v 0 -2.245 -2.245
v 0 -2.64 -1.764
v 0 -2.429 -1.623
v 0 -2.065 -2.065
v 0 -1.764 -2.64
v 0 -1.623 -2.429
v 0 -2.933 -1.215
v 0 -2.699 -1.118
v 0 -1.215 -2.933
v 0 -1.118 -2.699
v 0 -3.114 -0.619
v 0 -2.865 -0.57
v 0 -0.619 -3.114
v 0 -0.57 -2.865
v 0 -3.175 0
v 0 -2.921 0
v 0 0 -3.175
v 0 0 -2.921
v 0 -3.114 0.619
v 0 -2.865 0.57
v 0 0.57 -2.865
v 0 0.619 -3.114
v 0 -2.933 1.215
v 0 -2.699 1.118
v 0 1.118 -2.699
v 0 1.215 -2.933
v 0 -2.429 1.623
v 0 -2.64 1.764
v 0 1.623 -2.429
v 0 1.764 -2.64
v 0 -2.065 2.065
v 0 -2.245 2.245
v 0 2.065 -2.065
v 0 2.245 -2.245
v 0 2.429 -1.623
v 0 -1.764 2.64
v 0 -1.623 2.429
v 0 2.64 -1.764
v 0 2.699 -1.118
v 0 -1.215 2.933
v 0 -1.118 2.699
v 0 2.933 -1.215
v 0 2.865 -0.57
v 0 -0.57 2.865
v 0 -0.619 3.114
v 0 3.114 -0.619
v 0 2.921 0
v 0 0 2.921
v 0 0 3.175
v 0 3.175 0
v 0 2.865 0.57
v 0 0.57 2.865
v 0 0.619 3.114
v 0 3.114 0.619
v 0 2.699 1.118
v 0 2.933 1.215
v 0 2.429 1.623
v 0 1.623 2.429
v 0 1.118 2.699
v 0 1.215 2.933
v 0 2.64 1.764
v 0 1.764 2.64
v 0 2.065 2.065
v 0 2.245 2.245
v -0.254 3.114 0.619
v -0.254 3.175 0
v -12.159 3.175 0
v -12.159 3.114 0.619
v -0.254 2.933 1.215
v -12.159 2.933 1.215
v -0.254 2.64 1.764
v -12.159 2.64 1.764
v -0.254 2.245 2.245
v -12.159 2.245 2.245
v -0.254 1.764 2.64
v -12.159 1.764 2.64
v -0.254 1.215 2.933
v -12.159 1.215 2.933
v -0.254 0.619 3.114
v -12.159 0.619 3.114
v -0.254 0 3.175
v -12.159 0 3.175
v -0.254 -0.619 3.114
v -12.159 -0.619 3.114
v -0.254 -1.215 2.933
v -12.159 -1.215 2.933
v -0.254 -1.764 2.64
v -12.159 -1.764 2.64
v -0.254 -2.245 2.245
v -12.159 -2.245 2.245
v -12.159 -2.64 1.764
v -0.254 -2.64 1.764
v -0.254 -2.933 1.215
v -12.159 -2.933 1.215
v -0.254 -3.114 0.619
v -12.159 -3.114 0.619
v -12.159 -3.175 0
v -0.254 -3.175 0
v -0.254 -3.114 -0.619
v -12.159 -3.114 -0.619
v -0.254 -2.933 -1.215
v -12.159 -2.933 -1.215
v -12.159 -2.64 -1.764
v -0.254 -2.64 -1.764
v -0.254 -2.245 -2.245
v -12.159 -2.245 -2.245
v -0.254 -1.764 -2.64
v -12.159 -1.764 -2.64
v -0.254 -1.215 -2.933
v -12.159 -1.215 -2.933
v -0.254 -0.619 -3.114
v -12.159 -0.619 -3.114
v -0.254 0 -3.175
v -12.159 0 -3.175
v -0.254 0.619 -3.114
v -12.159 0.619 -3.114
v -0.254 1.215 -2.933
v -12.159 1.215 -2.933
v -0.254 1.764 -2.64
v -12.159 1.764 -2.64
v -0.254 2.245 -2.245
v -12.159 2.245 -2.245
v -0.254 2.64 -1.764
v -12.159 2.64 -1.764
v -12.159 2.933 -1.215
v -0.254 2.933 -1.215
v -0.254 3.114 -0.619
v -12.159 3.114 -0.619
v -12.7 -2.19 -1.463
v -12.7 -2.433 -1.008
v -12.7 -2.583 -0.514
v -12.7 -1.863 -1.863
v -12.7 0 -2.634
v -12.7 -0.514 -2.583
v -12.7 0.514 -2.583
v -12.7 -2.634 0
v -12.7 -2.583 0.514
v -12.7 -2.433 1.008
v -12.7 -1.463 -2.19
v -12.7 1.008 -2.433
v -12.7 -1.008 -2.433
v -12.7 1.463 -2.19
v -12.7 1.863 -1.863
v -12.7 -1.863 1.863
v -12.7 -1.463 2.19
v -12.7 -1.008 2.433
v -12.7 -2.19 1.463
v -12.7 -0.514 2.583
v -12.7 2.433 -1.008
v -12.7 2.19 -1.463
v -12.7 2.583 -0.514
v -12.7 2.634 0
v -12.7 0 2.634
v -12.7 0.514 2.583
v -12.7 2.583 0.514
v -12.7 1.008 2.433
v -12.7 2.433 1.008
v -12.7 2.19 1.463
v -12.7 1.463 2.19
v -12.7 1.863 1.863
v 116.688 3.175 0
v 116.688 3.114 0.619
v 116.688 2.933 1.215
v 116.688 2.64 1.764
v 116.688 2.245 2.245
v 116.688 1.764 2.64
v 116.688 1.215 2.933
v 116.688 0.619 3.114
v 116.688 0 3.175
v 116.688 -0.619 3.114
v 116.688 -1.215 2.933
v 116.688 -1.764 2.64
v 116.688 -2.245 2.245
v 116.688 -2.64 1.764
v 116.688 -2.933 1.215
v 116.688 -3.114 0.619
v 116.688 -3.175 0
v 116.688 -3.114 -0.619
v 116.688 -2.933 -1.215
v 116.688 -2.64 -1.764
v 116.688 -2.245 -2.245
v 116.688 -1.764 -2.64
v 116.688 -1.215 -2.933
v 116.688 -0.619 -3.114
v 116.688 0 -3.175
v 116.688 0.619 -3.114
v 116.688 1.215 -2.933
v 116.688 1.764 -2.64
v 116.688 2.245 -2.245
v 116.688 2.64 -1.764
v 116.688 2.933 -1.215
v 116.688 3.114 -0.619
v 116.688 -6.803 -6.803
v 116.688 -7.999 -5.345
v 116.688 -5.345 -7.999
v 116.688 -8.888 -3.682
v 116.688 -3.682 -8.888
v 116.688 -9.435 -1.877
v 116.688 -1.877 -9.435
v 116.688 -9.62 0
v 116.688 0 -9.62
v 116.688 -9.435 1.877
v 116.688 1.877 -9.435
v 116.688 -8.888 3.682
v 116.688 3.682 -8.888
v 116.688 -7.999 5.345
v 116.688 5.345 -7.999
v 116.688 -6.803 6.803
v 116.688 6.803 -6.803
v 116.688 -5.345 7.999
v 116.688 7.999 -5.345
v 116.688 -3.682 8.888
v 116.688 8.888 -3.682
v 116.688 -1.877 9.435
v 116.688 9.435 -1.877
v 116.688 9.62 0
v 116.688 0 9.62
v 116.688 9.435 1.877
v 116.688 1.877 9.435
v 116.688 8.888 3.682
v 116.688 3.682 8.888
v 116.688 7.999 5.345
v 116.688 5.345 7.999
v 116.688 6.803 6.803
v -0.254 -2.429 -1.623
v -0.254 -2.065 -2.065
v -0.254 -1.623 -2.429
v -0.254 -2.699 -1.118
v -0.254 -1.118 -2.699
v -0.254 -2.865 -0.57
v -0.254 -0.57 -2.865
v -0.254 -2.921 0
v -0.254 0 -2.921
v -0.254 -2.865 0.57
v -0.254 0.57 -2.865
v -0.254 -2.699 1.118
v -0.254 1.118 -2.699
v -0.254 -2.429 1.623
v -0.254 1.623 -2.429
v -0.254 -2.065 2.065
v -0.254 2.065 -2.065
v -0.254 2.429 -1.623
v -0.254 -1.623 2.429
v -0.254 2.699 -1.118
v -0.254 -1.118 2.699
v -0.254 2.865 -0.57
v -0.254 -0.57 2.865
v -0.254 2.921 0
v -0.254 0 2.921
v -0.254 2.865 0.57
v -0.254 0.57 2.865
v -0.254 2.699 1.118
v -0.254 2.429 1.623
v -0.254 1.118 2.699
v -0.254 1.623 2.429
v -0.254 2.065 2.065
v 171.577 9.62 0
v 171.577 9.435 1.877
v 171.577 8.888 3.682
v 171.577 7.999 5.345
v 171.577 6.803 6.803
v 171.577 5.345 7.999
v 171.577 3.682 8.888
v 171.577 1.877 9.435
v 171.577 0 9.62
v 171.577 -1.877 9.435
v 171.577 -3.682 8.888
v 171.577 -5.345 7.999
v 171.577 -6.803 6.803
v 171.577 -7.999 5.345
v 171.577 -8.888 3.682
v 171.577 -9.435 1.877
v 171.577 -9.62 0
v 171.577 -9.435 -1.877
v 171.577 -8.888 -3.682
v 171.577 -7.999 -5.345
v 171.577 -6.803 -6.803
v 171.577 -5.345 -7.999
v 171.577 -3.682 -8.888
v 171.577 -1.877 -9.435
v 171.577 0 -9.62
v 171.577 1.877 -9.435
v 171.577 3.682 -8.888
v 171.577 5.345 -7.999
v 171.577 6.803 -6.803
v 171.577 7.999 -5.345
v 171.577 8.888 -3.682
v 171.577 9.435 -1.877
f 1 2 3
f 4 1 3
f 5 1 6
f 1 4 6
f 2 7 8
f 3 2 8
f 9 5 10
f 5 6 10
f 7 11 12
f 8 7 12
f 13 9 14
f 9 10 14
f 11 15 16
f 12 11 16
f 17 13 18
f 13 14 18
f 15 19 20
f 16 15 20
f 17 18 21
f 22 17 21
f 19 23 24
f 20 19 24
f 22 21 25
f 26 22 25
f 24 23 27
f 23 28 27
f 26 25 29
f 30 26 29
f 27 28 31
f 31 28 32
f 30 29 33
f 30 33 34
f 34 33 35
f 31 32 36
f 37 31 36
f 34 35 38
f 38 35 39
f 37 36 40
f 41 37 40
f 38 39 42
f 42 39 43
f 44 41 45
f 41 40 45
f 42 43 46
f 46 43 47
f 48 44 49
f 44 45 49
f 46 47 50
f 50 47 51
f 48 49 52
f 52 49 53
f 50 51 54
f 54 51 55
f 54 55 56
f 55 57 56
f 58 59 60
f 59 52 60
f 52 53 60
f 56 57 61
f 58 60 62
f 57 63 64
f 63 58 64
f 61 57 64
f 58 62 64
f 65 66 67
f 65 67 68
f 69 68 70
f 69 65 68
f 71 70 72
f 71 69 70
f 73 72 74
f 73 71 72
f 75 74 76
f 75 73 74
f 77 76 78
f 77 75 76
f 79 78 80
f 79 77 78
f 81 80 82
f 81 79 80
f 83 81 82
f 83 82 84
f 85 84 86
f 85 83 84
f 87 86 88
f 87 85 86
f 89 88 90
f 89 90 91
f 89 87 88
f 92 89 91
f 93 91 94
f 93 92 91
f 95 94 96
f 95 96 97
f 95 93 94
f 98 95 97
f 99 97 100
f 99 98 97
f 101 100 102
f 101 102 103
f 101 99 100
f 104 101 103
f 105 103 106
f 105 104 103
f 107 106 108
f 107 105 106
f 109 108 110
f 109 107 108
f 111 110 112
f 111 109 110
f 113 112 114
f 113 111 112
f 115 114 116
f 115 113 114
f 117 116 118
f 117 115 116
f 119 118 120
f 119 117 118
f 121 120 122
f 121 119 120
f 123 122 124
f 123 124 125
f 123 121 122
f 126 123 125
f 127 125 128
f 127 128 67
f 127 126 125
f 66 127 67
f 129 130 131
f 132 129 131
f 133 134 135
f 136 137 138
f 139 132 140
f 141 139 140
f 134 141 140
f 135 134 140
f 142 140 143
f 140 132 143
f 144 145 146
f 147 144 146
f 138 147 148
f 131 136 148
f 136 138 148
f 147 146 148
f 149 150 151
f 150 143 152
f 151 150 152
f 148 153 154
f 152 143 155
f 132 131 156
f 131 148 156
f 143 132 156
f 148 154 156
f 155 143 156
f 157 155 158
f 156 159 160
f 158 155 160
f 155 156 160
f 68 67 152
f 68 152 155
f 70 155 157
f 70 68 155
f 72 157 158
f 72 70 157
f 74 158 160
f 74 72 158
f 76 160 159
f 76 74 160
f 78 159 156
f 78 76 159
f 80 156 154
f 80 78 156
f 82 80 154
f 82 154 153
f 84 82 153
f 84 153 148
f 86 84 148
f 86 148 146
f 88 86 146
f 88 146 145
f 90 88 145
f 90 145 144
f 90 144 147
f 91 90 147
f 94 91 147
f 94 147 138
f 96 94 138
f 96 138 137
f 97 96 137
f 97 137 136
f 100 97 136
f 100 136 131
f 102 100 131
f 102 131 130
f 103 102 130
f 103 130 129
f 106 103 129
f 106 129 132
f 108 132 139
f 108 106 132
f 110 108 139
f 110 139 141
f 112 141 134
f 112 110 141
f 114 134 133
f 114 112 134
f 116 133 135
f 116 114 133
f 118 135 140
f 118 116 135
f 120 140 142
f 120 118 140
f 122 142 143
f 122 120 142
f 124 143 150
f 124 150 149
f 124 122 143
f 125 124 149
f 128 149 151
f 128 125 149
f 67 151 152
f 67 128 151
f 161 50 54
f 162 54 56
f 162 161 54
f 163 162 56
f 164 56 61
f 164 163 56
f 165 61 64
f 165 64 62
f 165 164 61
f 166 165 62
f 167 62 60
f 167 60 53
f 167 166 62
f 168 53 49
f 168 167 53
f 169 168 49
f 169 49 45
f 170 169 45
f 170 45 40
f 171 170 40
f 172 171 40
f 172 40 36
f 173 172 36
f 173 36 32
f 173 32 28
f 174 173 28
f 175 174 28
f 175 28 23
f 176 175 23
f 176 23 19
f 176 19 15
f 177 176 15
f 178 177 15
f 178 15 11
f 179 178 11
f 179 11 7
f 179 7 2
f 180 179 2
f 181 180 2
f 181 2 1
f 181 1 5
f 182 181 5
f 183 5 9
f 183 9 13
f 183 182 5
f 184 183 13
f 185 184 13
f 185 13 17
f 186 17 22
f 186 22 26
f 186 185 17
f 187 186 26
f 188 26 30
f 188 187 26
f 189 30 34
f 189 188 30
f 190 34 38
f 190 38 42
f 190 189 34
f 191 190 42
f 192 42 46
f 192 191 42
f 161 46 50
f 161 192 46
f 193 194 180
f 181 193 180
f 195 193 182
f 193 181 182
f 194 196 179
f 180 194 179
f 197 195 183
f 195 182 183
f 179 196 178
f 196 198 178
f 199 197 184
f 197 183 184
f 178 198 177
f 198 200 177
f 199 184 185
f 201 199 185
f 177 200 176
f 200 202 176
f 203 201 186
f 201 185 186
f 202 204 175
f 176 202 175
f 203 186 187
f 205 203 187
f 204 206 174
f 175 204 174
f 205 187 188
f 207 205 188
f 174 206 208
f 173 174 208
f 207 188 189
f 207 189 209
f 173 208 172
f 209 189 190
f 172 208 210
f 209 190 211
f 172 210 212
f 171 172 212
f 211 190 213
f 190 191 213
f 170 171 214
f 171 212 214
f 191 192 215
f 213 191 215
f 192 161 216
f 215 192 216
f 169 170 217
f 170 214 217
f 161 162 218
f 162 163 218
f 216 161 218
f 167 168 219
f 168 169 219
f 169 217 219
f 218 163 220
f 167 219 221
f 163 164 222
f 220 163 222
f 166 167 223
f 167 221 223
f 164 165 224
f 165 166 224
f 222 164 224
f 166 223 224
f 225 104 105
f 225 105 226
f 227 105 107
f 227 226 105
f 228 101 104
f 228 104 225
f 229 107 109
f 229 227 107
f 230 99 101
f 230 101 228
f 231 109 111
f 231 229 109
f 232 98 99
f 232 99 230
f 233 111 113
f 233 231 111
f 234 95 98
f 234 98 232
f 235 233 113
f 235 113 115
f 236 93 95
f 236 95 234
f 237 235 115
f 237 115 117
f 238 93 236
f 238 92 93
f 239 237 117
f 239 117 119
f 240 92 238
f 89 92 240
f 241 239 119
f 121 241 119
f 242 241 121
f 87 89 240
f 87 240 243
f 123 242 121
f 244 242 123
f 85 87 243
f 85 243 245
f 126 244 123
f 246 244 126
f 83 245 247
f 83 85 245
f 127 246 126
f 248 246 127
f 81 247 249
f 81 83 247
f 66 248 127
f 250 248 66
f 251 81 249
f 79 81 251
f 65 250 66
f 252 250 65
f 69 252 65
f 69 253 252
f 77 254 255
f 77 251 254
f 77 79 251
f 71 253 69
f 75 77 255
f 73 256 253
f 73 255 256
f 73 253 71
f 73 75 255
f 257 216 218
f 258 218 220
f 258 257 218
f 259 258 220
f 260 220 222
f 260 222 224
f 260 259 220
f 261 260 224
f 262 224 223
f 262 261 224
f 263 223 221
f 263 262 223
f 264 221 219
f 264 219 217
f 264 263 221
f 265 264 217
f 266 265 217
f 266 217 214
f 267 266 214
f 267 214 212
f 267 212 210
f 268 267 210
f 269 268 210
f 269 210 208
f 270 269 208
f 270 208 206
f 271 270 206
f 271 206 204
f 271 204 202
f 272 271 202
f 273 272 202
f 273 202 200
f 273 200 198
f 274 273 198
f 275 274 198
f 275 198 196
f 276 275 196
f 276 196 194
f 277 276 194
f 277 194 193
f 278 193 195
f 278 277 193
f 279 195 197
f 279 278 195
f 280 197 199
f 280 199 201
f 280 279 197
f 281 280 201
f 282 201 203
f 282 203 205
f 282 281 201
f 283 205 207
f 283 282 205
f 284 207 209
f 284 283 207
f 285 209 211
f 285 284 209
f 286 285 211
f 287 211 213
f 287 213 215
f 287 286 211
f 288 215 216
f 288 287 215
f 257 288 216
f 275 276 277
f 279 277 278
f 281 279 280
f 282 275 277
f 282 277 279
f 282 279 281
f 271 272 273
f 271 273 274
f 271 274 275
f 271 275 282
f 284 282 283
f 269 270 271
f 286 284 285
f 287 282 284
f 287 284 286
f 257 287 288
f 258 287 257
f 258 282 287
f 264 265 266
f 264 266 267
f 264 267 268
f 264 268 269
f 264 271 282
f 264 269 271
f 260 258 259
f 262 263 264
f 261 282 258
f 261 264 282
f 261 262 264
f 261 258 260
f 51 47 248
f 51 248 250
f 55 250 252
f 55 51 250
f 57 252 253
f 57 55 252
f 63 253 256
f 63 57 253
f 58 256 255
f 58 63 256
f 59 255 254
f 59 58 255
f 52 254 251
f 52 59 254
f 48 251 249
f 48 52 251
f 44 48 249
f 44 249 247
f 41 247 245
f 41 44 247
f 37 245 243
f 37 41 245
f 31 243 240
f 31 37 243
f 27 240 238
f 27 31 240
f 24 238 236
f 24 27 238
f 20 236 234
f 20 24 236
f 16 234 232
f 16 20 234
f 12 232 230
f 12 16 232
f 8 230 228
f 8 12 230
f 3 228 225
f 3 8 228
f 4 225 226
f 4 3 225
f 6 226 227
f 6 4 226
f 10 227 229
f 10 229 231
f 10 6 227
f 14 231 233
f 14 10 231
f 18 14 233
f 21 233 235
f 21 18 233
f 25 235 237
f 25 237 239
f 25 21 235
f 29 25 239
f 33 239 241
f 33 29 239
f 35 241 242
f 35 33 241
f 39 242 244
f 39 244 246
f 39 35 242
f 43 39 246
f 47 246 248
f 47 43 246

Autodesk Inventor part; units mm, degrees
sketch "Sketch_1" plane through (0, 0, 0) normal (0, 0, 1) x (1, 0, 0)
  line L0 (171.577, 0) -> (0, 0)
  line L1 (0, 0) -> (0, 3.175)
  line L2 (0, 3.175) -> (116.6876, 3.175)
  line L3 (116.6876, 3.175) -> (116.6876, 9.6203)
  line L4 (116.6876, 9.6203) -> (171.577, 9.6203)
  line L5 (171.577, 9.6203) -> (171.577, 0)
  line L6 (171.577, 0) -> (0, 0)
revolve "Revolution1" add sketch "Sketch_1" angle 360 about axis through (171.577, 0, 0) along (1, 0, 0)
sketch "Sketch_3" plane through (0, 0, 0) normal (0, 0, 1) x (1, 0, 0)
  line L0 (0, 0) -> (-12.7, 0)
  line L1 (-12.7, 0) -> (-12.7, 2.634)
  line L2 (-12.7, 2.634) -> (-12.159, 3.175)
  line L3 (-12.159, 3.175) -> (0, 3.175)
  line L4 (0, 3.175) -> (0, 0)
  line L5 (0, 0) -> (-12.7, 0)
revolve "Revolution2" add sketch "Sketch_3" angle 360 about axis through (0, 0, 0) along (1, 0, 0)
thread "Thread1" size "1/4-28 UNF" class "2A" standard "ANSI Unified Screw Threads" length 12.159
sketch "Sketch_30" plane through (0, 0, 0) normal (0, 0, 1) x (1, 0, 0)
  line L0 (0, 0) -> (-0.254, 0)
  line L1 (-0.254, 2.921) -> (0, 2.921)
  line L2 (0, 2.921) -> (0, 3.429)
  line L3 (0, 3.429) -> (-0.254, 3.429)
  line L4 (-0.254, 3.429) -> (-0.254, 2.921)
revolve "Revolution3" cut sketch "Sketch_30" angle 360 about axis through (0, 0, 0) along (1, 0, 0)
ref_plane "dia1_XY" through (0, 3.175, 0) normal (1, 0, 0) x (0, 0, -1)
ref_plane "dia1_YZ" through (0, 3.175, 0) normal (0, 0, -1) x (0, 1, 0)
ref_plane "dia1_ZX" through (0, 3.175, 0) normal (0, 1, 0) x (1, 0, 0)
ref_plane "dia12_XY" through (0, 0, 10.9537) normal (1, 0, 0) x (0, 0, -1)
ref_plane "dia12_YZ" through (0, 0, 10.9537) normal (0, 0, -1) x (0, 1, 0)
ref_plane "dia12_ZX" through (0, 0, 10.9537) normal (0, 1, 0) x (1, 0, 0)
ref_plane "dia1r_XY" through (0, 0, 10.2235) normal (1, 0, 0) x (0, 0, -1)
ref_plane "dia1r_YZ" through (0, 0, 10.2235) normal (0, 0, -1) x (0, 1, 0)
ref_plane "dia1r_ZX" through (0, 0, 10.2235) normal (0, 1, 0) x (1, 0, 0)
ref_plane "dia2_XY" through (0, -3.175, 0) normal (1, 0, 0) x (0, 0, -1)
ref_plane "dia2_YZ" through (0, -3.175, 0) normal (0, 0, -1) x (0, 1, 0)
ref_plane "dia2_ZX" through (0, -3.175, 0) normal (0, 1, 0) x (1, 0, 0)
ref_plane "dia22_XY" through (0, 0, -10.9537) normal (1, 0, 0) x (0, 0, -1)
ref_plane "dia22_YZ" through (0, 0, -10.9537) normal (0, 0, -1) x (0, 1, 0)
ref_plane "dia22_ZX" through (0, 0, -10.9537) normal (0, 1, 0) x (1, 0, 0)
ref_plane "dia2r_XY" through (0, 0, -10.2235) normal (1, 0, 0) x (0, 0, -1)
ref_plane "dia2r_YZ" through (0, 0, -10.2235) normal (0, 0, -1) x (0, 1, 0)
ref_plane "dia2r_ZX" through (0, 0, -10.2235) normal (0, 1, 0) x (1, 0, 0)
ref_plane "rl1_XY" through (-12.7, 0, 0) normal (1, 0, 0) x (0, 0, -1)
ref_plane "rl1_YZ" through (-12.7, 0, 0) normal (0, 0, -1) x (0, 1, 0)
ref_plane "rl1_ZX" through (-12.7, 0, 0) normal (0, 1, 0) x (1, 0, 0)
ref_plane "rl2_XY" through (0, 0, 0) normal (1, 0, 0) x (0, 0, -1)
ref_plane "rl2_YZ" through (0, 0, 0) normal (0, 0, -1) x (0, 1, 0)
ref_plane "rl2_ZX" through (0, 0, 0) normal (0, 1, 0) x (1, 0, 0)
ref_plane "rod_cp_XY" through (0, 0, 0) normal (1, 0, 0) x (0, 0, -1)
ref_plane "rod_cp_YZ" through (0, 0, 0) normal (0, 0, -1) x (0, 1, 0)
ref_plane "rod_cp_ZX" through (0, 0, 0) normal (0, 1, 0) x (1, 0, 0)
ref_plane "stroke1_XY" through (0, 0, 0) normal (1, 0, 0) x (0, 0, -1)
ref_plane "stroke1_YZ" through (0, 0, 0) normal (0, 0, -1) x (0, 1, 0)
ref_plane "stroke1_ZX" through (0, 0, 0) normal (0, 1, 0) x (1, 0, 0)
ref_plane "thd1_XY" through (-12.7, 3.175, 0) normal (1, 0, 0) x (0, 0, -1)
ref_plane "thd1_YZ" through (-12.7, 3.175, 0) normal (0, 0, -1) x (0, 1, 0)
ref_plane "thd1_ZX" through (-12.7, 3.175, 0) normal (0, 1, 0) x (1, 0, 0)
ref_plane "thd2_XY" through (-12.7, -3.175, 0) normal (1, 0, 0) x (0, 0, -1)
ref_plane "thd2_YZ" through (-12.7, -3.175, 0) normal (0, 0, -1) x (0, 1, 0)
ref_plane "thd2_ZX" through (-12.7, -3.175, 0) normal (0, 1, 0) x (1, 0, 0)
ref_plane "to_rod_clevis_XY" through (-16.764, 0, 0) normal (1, 0, 0) x (0, 0, -1)
ref_plane "to_rod_clevis_YZ" through (-16.764, 0, 0) normal (0, 0, -1) x (0, 1, 0)
ref_plane "to_rod_clevis_ZX" through (-16.764, 0, 0) normal (0, 1, 0) x (1, 0, 0)
properties part number "C-043-R0000_rod"
